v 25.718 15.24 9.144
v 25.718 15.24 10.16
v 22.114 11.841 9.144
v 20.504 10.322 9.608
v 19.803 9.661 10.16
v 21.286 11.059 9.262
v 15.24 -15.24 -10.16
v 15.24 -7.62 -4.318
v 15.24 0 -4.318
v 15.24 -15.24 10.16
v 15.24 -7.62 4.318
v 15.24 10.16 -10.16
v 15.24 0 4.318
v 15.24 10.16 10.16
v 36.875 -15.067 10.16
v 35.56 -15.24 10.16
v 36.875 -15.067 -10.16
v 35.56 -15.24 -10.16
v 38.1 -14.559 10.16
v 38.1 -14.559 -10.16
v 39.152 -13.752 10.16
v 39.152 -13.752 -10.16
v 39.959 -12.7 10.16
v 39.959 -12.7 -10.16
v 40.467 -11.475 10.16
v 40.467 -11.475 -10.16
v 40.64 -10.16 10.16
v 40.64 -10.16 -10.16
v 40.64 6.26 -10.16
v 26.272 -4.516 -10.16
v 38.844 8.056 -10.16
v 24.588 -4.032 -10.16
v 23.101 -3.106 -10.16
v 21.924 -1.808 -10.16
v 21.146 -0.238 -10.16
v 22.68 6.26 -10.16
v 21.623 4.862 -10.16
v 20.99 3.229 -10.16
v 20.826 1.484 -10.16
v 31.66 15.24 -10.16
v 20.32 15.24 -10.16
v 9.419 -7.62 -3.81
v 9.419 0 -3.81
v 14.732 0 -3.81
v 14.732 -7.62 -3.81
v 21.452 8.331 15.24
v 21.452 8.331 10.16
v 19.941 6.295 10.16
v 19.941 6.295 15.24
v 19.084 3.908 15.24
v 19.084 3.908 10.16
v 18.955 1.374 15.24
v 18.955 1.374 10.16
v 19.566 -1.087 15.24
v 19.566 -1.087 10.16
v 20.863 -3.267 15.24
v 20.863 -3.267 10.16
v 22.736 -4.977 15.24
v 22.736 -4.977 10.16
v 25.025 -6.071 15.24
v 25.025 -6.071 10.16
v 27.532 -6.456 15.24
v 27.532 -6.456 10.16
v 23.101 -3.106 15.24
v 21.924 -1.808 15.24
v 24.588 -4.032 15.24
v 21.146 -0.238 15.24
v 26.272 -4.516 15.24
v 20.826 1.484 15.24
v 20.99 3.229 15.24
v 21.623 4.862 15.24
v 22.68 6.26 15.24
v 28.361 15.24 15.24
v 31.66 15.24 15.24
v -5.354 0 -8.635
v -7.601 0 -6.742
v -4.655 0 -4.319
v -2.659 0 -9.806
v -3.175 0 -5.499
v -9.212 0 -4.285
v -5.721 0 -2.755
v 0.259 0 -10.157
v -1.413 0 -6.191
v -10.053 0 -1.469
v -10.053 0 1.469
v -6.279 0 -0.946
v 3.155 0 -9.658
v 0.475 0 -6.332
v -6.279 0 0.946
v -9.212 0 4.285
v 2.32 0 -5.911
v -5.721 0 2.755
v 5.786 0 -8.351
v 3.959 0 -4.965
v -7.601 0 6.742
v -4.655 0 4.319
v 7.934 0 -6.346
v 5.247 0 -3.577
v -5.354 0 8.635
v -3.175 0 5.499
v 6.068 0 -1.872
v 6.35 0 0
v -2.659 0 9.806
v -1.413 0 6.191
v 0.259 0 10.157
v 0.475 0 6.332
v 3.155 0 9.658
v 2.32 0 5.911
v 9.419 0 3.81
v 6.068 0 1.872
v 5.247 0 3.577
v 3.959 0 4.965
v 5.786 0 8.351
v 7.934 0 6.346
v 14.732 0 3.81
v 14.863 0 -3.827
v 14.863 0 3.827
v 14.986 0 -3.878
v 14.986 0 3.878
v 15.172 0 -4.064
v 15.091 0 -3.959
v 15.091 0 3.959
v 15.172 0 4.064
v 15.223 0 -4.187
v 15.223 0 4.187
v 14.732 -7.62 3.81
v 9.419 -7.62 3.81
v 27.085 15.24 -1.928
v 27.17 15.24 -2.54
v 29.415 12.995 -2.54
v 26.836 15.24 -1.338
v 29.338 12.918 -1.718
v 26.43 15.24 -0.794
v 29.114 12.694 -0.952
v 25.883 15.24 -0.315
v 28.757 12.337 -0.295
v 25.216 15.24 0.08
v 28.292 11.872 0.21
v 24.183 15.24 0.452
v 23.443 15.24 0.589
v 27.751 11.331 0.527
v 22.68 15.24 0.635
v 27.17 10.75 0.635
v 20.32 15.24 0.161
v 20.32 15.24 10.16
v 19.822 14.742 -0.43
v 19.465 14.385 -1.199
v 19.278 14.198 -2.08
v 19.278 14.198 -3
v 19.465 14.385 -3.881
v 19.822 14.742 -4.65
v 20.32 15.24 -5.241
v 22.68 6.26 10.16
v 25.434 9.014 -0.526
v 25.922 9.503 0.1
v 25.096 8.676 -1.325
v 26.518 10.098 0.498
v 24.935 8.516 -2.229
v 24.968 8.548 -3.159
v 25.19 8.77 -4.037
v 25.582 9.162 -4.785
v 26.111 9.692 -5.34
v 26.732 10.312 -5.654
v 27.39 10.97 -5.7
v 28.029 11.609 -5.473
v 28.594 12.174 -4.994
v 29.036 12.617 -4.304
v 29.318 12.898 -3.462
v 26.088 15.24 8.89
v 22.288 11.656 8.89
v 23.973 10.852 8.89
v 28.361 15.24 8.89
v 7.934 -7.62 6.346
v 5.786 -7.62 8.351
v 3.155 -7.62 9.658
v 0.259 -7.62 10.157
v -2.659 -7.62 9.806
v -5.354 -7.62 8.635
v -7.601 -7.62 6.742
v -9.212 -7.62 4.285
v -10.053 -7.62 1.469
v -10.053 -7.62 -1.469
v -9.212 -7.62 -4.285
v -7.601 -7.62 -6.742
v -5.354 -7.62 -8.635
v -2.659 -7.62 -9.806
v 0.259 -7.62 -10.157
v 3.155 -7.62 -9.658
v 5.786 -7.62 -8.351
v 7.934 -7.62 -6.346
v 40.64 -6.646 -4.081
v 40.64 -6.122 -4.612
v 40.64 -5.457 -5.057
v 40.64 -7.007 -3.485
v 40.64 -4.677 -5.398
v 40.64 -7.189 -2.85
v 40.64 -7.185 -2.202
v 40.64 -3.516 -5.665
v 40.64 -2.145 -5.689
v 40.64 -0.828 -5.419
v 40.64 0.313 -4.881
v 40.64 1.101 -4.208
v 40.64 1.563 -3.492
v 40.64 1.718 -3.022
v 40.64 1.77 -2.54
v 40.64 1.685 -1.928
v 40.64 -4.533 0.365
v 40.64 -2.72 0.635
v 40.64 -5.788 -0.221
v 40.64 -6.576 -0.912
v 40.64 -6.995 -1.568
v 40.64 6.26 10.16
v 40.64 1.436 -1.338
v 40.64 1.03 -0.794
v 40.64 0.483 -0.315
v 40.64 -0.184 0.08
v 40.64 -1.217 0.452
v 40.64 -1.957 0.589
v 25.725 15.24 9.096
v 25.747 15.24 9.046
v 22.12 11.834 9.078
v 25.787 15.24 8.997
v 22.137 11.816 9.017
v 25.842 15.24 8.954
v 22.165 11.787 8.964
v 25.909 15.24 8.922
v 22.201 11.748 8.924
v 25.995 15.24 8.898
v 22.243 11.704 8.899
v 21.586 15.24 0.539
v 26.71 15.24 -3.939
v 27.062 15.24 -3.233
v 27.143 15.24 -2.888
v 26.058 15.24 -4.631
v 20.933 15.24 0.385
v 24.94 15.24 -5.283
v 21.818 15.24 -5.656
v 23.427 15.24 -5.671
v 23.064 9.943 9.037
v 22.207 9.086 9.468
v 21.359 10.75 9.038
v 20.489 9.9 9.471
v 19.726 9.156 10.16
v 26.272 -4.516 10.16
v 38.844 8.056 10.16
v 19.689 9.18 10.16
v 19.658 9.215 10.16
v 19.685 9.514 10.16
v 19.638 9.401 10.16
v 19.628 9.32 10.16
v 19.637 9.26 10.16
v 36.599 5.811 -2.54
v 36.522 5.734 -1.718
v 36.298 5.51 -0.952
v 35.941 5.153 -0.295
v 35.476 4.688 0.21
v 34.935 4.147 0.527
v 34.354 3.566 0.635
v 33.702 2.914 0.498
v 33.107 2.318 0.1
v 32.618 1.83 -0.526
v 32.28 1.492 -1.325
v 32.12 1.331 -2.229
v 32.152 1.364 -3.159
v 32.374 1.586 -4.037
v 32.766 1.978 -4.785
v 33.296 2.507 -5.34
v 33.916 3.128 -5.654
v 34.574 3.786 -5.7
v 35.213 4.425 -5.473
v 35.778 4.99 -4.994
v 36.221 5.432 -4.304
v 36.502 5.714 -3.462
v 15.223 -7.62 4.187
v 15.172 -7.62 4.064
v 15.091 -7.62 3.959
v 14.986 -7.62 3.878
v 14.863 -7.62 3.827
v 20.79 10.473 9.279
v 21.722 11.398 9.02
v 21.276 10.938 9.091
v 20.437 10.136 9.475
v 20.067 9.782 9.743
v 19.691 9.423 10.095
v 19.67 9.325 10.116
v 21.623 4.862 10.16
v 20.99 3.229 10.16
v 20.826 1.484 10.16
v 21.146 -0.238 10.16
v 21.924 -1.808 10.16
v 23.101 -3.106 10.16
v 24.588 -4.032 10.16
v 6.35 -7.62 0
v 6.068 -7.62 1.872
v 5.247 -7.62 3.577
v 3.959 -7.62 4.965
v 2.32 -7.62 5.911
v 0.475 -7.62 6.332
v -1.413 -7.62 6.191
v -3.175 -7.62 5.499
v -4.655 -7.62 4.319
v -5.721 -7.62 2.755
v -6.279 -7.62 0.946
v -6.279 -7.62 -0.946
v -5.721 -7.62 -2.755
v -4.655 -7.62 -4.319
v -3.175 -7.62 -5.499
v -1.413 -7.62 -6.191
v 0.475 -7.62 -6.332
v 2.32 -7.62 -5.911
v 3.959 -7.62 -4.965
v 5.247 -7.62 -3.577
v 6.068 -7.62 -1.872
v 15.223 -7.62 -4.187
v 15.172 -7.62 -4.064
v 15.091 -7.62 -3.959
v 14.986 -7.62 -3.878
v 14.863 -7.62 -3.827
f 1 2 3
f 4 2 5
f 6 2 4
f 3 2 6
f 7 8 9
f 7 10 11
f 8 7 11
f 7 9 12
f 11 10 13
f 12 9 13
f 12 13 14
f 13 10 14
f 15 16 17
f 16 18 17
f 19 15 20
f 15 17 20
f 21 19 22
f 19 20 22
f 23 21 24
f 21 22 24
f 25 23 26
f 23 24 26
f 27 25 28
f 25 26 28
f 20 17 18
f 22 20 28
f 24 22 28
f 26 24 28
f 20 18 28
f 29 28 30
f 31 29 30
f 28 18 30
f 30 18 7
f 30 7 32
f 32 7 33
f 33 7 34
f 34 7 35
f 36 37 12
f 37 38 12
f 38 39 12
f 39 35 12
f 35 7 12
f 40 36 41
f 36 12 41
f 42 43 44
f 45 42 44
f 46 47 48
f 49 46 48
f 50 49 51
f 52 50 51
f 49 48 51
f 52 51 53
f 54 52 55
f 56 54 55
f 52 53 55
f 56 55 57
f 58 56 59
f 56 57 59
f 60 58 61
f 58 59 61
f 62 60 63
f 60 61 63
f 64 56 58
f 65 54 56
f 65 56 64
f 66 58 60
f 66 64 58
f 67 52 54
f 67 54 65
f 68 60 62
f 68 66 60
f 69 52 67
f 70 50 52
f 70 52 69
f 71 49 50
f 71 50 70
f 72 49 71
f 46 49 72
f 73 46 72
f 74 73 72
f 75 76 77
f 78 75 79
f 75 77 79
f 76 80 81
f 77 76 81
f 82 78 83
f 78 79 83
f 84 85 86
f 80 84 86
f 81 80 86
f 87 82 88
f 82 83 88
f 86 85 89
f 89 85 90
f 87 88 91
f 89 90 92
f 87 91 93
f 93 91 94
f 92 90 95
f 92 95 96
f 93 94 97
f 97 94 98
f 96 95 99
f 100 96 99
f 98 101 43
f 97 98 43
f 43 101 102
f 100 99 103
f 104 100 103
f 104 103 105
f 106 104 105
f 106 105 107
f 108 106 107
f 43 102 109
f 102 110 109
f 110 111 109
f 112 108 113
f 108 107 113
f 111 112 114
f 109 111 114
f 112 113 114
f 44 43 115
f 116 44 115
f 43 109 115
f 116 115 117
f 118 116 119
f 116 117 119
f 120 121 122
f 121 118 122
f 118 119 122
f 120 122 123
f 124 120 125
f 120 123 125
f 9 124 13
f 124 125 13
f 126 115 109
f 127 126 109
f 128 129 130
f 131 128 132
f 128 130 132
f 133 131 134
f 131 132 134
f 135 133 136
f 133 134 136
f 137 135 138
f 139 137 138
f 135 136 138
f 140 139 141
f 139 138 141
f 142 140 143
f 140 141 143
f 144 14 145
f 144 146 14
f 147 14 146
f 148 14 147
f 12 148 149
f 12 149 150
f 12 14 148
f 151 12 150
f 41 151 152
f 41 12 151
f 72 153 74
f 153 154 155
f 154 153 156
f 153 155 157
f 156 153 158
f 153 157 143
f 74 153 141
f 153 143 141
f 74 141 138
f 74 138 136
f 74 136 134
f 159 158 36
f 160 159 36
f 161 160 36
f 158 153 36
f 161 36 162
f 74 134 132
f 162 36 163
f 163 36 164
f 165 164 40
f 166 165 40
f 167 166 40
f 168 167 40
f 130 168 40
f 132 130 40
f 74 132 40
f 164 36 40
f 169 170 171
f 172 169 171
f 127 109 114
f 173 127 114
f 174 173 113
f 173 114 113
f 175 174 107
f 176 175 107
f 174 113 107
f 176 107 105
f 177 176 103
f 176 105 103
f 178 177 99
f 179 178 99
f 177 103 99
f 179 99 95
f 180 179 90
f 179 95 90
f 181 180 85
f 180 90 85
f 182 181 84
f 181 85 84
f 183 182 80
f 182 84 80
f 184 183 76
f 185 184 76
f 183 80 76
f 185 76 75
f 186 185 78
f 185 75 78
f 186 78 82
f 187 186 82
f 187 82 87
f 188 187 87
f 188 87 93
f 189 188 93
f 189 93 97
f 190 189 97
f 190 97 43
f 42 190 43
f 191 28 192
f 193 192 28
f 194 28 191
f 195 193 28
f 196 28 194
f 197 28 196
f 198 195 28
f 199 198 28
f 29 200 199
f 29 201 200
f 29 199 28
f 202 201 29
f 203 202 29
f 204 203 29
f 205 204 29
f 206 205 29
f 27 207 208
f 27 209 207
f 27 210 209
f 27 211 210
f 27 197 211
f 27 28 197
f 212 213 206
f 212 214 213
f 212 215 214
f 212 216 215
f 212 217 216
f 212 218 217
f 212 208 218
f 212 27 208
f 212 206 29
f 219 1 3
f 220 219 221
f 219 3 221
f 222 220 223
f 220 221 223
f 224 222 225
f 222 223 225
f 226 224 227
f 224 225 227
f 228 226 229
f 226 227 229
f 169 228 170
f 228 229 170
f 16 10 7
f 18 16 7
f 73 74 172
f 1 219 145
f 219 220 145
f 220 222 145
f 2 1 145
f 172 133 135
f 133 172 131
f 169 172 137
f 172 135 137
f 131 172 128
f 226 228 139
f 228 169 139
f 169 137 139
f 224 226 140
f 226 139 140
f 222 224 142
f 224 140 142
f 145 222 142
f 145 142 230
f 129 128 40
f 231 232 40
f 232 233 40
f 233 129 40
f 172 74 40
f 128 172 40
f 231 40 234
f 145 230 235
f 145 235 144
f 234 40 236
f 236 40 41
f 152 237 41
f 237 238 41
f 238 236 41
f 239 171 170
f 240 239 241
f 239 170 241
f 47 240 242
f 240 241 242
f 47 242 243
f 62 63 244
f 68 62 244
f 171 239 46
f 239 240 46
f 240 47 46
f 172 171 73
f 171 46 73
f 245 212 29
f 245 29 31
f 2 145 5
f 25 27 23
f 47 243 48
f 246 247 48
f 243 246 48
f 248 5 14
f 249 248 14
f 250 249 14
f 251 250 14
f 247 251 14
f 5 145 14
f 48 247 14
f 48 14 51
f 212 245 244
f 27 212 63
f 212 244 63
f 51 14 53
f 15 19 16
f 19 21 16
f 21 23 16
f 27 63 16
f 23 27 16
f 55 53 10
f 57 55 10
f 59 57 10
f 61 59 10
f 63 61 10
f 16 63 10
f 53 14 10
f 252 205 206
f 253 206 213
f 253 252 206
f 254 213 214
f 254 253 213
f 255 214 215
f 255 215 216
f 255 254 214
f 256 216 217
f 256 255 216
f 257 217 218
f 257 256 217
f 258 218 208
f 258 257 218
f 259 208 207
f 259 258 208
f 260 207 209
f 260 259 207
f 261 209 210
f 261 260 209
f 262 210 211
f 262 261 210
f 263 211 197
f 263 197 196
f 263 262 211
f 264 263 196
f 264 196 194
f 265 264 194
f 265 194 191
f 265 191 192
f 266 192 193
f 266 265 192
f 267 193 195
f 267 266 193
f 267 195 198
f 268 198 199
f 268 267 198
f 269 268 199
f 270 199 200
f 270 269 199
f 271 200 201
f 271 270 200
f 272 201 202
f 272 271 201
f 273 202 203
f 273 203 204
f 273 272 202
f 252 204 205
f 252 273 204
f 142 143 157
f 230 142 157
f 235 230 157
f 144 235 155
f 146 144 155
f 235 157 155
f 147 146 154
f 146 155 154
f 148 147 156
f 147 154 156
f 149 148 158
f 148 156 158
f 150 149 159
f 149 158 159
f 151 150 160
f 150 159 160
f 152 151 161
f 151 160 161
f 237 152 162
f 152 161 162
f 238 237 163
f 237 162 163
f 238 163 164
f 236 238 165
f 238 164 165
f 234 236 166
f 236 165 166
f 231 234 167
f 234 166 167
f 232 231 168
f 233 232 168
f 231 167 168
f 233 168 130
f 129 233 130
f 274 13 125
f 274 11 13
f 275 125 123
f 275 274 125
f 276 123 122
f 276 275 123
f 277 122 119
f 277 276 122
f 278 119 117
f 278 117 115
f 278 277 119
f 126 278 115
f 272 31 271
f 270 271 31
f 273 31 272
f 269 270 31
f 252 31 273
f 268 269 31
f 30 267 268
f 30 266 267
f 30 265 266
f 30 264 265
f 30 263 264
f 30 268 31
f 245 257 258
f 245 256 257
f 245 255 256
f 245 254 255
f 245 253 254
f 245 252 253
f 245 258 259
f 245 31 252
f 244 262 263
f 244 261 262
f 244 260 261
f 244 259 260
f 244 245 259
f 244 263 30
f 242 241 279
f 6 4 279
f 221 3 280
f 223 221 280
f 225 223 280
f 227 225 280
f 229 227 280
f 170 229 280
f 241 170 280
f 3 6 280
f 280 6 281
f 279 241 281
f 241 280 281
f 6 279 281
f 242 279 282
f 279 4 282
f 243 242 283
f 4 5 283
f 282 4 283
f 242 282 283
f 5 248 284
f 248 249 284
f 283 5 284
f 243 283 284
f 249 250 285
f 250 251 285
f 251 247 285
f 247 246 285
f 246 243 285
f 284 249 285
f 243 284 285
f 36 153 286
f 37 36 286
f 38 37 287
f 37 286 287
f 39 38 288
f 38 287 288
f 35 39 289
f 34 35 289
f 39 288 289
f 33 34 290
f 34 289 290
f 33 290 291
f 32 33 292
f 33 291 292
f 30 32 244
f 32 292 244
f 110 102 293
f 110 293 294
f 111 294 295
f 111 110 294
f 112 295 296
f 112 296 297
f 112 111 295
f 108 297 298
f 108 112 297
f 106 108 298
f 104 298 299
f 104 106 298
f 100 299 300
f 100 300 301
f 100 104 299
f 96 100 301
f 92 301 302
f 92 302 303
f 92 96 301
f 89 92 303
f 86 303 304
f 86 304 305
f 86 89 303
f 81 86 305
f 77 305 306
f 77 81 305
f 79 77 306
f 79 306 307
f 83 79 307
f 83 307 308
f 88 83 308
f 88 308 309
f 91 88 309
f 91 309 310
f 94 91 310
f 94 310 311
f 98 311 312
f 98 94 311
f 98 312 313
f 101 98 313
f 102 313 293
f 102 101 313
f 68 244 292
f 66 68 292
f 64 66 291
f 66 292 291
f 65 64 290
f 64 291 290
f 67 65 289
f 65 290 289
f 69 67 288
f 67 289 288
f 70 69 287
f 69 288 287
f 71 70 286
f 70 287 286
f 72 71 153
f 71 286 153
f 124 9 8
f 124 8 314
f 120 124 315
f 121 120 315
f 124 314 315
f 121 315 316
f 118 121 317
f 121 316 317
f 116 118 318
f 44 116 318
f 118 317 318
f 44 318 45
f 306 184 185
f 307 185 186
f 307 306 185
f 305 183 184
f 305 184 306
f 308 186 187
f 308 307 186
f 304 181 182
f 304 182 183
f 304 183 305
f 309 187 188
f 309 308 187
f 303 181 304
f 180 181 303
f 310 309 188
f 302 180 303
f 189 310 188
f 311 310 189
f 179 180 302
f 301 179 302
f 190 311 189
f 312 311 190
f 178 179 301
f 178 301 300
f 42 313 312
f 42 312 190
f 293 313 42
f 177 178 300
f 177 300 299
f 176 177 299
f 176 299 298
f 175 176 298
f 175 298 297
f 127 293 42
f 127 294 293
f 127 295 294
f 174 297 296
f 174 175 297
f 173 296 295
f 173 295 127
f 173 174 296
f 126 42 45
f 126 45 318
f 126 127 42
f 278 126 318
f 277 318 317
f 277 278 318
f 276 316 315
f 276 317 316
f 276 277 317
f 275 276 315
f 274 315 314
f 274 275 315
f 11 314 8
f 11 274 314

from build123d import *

# Parameters (mm, degrees)
F0_R         = 6.35
F1_DEPTH     = 7.62
F2_W         = 7.62
F2_H         = 6.35
F3_DEPTH     = 25.4
F5_DEPTH     = 25.4
F7_DEPTH     = 63.5
F9_DEPTH     = 20.32
F11_DEPTH    = 25.4
F12_R        = 5.08
F13_R        = 0.508
F14_T1_DEPTH = 46.4482991577
F16_DEPTH    = 5.08
F18_DEPTH    = 1.27
F19_T4_DEPTH = 19.0509661188
F20_R        = 0.254


# Not quite as in the source:
# - a fillet or chamfer that OpenCascade refuses, or shapes differently, is made with other operations: its cross-section is extruded or revolved along the edge and cut away or added


with BuildPart() as f1:
    # F0 (on Front) → F1 (new body)
    with BuildSketch(Plane.XZ):
        with BuildLine():
            Line((15.24, 3.81), (9.4185720786, 3.81))
            ThreePointArc((9.4185720786, 3.81), (-10.16, 0), (9.4185720786, -3.81))
            Line((9.4185720786, -3.81), (15.24, -3.81))
            Line((15.24, -3.81), (15.24, 0))
            Line((15.24, 0), (15.24, 3.81))
        make_face()
        Circle(F0_R, mode=Mode.SUBTRACT)
    extrude(amount=F1_DEPTH)

    # F2 (on face) → F3 (join)
    with BuildSketch(Plane.YZ.offset(15.24)):
        Polygon((-7.62, 10.16), (-7.62, 3.81), (-15.24, 3.81), (-15.24, -10.16), (15.24, -10.16), (15.24, 3.81), (15.24, 10.16), align=None)
        with Locations((-11.43, 6.985)):
            Rectangle(F2_W, F2_H)
    extrude(amount=F3_DEPTH)

    # F4 (on face) → F5 (cut)
    with BuildSketch(Plane.XY.offset(10.16)):
        Polygon((31.65983, 15.24), (40.64, 15.24), (40.64, 6.25983), (47.585287597, 13.2393133827), (38.6222154898, 22.2023854898), align=None)
        Polygon((40.64, 6.25983), (40.64, 15.24), (31.65983, 15.24), align=None)
        with BuildLine():
            Line((40.64, 6.25983), (31.65983, 15.24))
            Line((31.65983, 15.24), (22.6795738789, 6.2597438789))
            ThreePointArc((22.6795738789, 6.2597438789), (22.6795738789, -2.7204261211), (31.6597438789, -2.7204261211))
            Line((31.6597438789, -2.7204261211), (40.64, 6.25983))
        make_face()
    extrude(amount=-F5_DEPTH, mode=Mode.SUBTRACT)

    # F6 (on face) → F7 (cut, symmetric)
    with BuildSketch(Plane(origin=(8.209915, -8.209915, 0), x_dir=(0.7071067812, 0.7071067812, 0), z_dir=(0.7071067812, -0.7071067812, 0))):
        with BuildLine():
            ThreePointArc((26.8131878295, 0.635), (24.5681237992, -4.7850640303), (29.9881878295, -2.54))
            ThreePointArc((29.9881878295, -2.54), (29.0582518598, -0.2949359697), (26.8131878295, 0.635))
        make_face()
    extrude(amount=F7_DEPTH, both=True, mode=Mode.SUBTRACT)

    # F8 (on face) → F9 (join)
    with BuildSketch(Plane.XY.offset(10.16)):
        with BuildLine():
            Line((31.6597438789, -2.7204261211), (40.64, 6.25983))
            Line((40.64, 6.25983), (38.8439487758, 8.0558812242))
            Line((38.8439487758, 8.0558812242), (26.2716117366, -4.516455815))
            ThreePointArc((26.2716117366, -4.516455815), (29.177671493, -4.2544271062), (31.6597438789, -2.7204261211))
        make_face()
    extrude(amount=-F9_DEPTH)

    # F10 (on face) → F11 (cut)
    with BuildSketch(Plane(origin=(8.209915, -8.209915, 0), x_dir=(0.7071067812, 0.7071067812, 0), z_dir=(0.7071067812, -0.7071067812, 0))):
        with BuildLine():
            ThreePointArc((29.9881878295, -2.54), (29.0582518598, -0.2949359697), (26.8131878295, 0.635))
            ThreePointArc((26.8131878295, 0.635), (24.5681237992, -4.7850640303), (29.9881878295, -2.54))
        make_face()
    extrude(amount=F11_DEPTH, mode=Mode.SUBTRACT)

    # F12
    f12_edges = [f1.edges().sort_by_distance(p)[0] for p in [
        (40.64, -15.24, 0),
    ]]
    fillet(f12_edges, radius=F12_R)

    # F13
    f13_edges = [f1.edges().sort_by_distance(p)[0] for p in [
        (15.24, -3.81, 3.81),
        (15.24, -3.81, -3.81),
    ]]
    fillet(f13_edges, radius=F13_R)

    # F14: chamfer of 5.08 on 1 edges, made by hand

    # F14_s2 → F14_t1 (cut)
    with BuildSketch(Plane.XY.offset(-23.2241495789)):
        Polygon((15.24, 10.16), (20.32, 15.24), (15.24, 15.24), align=None)
    extrude(amount=F14_T1_DEPTH, mode=Mode.SUBTRACT)

    # F15 (on face) → F16 (join)
    with BuildSketch(Plane.XY.offset(10.16)):
        with BuildLine():
            Line((31.65983, 15.24), (28.3609535545, 15.24))
            Line((28.3609535545, 15.24), (21.4524150836, 8.3314615291))
            ThreePointArc((21.4524150836, 8.3314615291), (19.5659150525, -1.0873397162), (27.5316145271, -6.4557967708))
            Line((27.5316145271, -6.4557967708), (26.2716117366, -4.516455815))
            ThreePointArc((26.2716117366, -4.516455815), (21.1455728938, -0.2383537351), (22.6795738789, 6.2597438789))
            Line((22.6795738789, 6.2597438789), (31.65983, 15.24))
        make_face()
    extrude(amount=F16_DEPTH)

    # F17 (on face) → F18 (cut)
    with BuildSketch(Plane.XY.offset(10.16)):
        Polygon((21.4524150836, 8.3314615291), (28.3609535545, 15.24), (25.7178656757, 15.24), (19.4216053933, 9.3011604622), align=None)
    extrude(amount=-F18_DEPTH, mode=Mode.SUBTRACT)

    # F19: fillet of radius 5.08 on 1 edges, made by hand


with BuildPart() as f19_tool2:
    # F19_s3 → F19_t4 (new body)
    with BuildSketch(Plane(origin=(4.6185626358, -2.2053347891, 0), x_dir=(0, 0, 1), z_dir=(0.9024034915, -0.4308920265, 0))):
        with BuildLine():
            ThreePointArc((8.89, -20.1221187471), (9.2180951188, -18.3260675229), (10.16, -16.762014582))
            Line((10.16, -16.762014582), (10.0838, -16.6948124987))
            ThreePointArc((10.0838, -16.6948124987), (9.525, -16.660414582), (8.89, -16.660414582))
            Line((8.89, -16.660414582), (8.7884, -16.762014582))
            Line((8.7884, -16.762014582), (8.7884, -20.1221187471))
            Line((8.7884, -20.1221187471), (8.89, -20.1221187471))
        make_face()
    extrude(amount=F19_T4_DEPTH)

    split(bisect_by=Plane(origin=(6.5604767773, -6.5604767773, 0), x_dir=(0, 0, 1), z_dir=(-0.7071067812, 0.7071067812, 0)), keep=Keep.TOP)

    split(bisect_by=Plane(origin=(4.5012786836, -4.7721818404, 0), x_dir=(0, 0, 1), z_dir=(0.6861575418, -0.727452973, 0)), keep=Keep.TOP)


with BuildPart() as f1_1:
    add(f1.part)

    # F19_t1: union F19_tool2
    add(f19_tool2.part)

    # F20
    f20_edges = [f1_1.edges().sort_by_distance(p)[0] for p in [
        (23.880158, 13.506614, 8.89),
        (20.64155, 10.451852, 9.218095),
    ]]
    fillet(f20_edges, radius=F20_R)


solid = f1_1.part
